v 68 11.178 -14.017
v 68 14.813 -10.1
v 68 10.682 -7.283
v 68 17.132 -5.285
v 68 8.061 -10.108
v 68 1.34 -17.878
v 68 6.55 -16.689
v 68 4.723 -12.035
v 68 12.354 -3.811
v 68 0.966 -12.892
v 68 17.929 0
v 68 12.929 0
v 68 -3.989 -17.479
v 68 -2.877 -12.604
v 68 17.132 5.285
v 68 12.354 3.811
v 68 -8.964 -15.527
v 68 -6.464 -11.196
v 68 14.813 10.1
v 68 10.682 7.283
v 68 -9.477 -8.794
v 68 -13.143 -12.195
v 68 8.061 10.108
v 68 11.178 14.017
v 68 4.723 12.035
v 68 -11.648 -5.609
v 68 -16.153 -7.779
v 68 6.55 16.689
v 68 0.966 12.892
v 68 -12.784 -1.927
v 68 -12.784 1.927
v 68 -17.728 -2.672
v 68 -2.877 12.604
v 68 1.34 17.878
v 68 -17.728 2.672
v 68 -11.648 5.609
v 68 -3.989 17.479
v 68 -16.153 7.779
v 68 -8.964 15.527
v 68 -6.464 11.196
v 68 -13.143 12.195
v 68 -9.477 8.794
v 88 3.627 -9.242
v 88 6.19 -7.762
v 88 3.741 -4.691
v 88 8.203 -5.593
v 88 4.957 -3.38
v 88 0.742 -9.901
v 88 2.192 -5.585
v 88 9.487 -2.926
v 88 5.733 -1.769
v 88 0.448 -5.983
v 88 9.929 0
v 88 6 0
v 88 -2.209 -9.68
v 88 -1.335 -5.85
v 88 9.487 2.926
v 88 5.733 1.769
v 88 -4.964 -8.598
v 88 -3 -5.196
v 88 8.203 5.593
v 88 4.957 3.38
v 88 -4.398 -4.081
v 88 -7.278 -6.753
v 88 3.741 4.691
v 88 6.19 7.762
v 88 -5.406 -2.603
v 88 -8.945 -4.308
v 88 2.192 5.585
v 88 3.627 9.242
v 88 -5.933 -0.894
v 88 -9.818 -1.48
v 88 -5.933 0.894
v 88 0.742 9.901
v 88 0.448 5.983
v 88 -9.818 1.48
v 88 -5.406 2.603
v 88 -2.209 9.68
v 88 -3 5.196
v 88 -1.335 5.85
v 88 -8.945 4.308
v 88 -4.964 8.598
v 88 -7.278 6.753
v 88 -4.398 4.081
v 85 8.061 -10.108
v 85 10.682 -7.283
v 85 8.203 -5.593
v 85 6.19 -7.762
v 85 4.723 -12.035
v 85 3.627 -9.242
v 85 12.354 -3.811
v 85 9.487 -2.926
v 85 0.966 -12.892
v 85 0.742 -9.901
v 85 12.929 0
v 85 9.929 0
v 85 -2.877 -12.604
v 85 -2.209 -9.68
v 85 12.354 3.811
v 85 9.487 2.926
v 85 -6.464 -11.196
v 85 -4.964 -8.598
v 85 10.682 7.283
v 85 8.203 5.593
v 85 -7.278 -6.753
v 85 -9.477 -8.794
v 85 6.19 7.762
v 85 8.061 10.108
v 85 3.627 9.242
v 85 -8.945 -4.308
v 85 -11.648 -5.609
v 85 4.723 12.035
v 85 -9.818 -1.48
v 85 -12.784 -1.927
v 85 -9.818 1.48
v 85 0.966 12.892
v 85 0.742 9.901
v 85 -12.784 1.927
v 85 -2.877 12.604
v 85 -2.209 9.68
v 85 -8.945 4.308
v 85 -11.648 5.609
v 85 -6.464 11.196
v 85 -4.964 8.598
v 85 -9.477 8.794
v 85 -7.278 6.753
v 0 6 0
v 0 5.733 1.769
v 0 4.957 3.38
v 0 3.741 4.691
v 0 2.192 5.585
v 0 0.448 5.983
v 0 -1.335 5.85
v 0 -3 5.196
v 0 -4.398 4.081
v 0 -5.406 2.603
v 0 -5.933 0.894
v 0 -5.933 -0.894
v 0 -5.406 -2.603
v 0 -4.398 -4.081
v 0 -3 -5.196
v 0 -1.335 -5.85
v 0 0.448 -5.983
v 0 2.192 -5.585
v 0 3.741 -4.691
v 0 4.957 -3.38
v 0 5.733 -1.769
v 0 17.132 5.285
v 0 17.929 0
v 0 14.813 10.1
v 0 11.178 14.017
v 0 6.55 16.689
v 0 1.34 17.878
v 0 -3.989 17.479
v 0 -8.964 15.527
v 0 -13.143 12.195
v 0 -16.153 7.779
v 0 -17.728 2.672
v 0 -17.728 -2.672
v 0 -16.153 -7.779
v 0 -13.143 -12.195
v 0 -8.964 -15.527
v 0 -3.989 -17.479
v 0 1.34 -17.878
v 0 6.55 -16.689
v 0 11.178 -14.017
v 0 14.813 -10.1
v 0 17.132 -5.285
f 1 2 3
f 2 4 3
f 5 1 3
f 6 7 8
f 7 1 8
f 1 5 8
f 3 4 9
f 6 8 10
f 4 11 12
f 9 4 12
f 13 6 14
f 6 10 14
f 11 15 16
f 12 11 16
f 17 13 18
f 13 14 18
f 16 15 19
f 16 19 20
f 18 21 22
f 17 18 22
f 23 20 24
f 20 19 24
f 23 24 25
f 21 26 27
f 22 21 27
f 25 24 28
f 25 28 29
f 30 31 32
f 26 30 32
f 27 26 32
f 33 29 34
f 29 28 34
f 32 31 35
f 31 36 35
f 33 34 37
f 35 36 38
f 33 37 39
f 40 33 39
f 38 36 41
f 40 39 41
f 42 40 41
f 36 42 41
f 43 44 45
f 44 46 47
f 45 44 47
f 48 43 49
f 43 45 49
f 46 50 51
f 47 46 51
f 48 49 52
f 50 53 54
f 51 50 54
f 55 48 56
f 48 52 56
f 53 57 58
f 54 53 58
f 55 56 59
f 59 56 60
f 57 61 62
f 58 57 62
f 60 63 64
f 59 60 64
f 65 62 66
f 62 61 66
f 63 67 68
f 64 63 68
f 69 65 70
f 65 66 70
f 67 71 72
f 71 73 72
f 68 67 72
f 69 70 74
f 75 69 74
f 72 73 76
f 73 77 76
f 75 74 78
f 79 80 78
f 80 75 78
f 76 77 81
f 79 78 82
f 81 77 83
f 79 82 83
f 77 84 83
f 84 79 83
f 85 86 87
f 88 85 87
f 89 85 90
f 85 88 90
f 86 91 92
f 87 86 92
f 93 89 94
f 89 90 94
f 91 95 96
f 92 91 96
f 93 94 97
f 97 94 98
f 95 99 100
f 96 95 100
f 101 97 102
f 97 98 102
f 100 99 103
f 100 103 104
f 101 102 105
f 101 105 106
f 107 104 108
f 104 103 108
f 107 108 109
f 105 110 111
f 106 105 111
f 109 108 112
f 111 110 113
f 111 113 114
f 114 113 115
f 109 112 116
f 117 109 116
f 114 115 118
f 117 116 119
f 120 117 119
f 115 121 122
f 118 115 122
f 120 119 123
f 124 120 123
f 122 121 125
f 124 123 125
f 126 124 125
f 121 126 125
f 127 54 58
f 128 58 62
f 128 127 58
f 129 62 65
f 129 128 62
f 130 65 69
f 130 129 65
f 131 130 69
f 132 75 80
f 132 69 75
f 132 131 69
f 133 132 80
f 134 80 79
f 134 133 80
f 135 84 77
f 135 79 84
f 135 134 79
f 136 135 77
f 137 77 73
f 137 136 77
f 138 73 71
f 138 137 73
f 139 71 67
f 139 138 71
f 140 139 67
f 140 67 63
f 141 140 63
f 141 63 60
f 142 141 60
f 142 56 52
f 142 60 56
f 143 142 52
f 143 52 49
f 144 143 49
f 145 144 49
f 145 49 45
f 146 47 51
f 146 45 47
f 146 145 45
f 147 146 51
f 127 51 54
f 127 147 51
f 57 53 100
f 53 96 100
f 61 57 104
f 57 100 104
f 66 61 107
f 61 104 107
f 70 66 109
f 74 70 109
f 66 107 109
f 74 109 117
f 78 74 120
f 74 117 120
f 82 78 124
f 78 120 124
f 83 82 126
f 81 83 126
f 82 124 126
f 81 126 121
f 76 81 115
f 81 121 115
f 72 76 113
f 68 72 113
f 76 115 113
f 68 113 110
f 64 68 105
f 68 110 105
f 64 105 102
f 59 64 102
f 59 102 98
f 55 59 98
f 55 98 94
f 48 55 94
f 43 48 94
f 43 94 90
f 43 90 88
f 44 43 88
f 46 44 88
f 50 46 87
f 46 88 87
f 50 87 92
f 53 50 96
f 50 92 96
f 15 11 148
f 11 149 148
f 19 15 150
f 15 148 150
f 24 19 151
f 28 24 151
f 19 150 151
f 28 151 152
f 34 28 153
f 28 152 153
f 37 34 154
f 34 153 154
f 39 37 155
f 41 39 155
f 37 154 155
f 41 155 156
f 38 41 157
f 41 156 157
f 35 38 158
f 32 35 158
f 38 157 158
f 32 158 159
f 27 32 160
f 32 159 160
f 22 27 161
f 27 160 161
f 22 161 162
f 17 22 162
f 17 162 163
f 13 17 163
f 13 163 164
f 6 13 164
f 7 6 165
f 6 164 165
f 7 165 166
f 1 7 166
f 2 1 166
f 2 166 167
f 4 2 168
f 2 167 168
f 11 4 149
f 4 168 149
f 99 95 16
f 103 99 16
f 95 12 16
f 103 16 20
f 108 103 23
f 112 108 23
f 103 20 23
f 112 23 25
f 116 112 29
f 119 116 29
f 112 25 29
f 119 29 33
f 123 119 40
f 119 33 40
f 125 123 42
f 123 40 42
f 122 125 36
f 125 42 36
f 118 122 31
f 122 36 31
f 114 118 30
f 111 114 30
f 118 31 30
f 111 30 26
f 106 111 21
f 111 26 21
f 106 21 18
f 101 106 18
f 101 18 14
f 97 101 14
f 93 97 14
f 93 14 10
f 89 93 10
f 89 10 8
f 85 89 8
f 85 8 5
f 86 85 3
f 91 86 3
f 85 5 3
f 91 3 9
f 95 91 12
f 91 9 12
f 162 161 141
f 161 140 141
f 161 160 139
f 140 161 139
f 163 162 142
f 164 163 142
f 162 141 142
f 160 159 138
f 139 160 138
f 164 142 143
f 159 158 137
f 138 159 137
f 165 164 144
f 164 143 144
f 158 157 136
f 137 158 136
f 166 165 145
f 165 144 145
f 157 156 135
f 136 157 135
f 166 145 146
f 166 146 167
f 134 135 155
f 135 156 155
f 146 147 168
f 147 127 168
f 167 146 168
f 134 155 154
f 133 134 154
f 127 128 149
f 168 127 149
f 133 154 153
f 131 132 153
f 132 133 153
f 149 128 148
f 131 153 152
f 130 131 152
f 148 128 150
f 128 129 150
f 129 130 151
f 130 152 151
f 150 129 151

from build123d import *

# Parameters (mm, degrees)
F2_R     = 6
F3_DEPTH = 88.001


with BuildPart() as f1:
    # F0 (on Top) → F1 (revolve)
    with BuildSketch(Plane.XY):
        Polygon((0, 17.928575), (0, 0), (88, 0), (88, 9.928573), (85, 9.928573), (85, 12.928574), (68, 12.928574), (68, 17.928575), align=None)
    revolve(axis=Axis((44, 0, 0), (1, 0, 0)))

    # F2 (on Right) → F3 (cut, through all)
    with BuildSketch(Plane.YZ):
        Circle(F2_R)
    extrude(amount=F3_DEPTH, mode=Mode.SUBTRACT)


solid = f1.part
